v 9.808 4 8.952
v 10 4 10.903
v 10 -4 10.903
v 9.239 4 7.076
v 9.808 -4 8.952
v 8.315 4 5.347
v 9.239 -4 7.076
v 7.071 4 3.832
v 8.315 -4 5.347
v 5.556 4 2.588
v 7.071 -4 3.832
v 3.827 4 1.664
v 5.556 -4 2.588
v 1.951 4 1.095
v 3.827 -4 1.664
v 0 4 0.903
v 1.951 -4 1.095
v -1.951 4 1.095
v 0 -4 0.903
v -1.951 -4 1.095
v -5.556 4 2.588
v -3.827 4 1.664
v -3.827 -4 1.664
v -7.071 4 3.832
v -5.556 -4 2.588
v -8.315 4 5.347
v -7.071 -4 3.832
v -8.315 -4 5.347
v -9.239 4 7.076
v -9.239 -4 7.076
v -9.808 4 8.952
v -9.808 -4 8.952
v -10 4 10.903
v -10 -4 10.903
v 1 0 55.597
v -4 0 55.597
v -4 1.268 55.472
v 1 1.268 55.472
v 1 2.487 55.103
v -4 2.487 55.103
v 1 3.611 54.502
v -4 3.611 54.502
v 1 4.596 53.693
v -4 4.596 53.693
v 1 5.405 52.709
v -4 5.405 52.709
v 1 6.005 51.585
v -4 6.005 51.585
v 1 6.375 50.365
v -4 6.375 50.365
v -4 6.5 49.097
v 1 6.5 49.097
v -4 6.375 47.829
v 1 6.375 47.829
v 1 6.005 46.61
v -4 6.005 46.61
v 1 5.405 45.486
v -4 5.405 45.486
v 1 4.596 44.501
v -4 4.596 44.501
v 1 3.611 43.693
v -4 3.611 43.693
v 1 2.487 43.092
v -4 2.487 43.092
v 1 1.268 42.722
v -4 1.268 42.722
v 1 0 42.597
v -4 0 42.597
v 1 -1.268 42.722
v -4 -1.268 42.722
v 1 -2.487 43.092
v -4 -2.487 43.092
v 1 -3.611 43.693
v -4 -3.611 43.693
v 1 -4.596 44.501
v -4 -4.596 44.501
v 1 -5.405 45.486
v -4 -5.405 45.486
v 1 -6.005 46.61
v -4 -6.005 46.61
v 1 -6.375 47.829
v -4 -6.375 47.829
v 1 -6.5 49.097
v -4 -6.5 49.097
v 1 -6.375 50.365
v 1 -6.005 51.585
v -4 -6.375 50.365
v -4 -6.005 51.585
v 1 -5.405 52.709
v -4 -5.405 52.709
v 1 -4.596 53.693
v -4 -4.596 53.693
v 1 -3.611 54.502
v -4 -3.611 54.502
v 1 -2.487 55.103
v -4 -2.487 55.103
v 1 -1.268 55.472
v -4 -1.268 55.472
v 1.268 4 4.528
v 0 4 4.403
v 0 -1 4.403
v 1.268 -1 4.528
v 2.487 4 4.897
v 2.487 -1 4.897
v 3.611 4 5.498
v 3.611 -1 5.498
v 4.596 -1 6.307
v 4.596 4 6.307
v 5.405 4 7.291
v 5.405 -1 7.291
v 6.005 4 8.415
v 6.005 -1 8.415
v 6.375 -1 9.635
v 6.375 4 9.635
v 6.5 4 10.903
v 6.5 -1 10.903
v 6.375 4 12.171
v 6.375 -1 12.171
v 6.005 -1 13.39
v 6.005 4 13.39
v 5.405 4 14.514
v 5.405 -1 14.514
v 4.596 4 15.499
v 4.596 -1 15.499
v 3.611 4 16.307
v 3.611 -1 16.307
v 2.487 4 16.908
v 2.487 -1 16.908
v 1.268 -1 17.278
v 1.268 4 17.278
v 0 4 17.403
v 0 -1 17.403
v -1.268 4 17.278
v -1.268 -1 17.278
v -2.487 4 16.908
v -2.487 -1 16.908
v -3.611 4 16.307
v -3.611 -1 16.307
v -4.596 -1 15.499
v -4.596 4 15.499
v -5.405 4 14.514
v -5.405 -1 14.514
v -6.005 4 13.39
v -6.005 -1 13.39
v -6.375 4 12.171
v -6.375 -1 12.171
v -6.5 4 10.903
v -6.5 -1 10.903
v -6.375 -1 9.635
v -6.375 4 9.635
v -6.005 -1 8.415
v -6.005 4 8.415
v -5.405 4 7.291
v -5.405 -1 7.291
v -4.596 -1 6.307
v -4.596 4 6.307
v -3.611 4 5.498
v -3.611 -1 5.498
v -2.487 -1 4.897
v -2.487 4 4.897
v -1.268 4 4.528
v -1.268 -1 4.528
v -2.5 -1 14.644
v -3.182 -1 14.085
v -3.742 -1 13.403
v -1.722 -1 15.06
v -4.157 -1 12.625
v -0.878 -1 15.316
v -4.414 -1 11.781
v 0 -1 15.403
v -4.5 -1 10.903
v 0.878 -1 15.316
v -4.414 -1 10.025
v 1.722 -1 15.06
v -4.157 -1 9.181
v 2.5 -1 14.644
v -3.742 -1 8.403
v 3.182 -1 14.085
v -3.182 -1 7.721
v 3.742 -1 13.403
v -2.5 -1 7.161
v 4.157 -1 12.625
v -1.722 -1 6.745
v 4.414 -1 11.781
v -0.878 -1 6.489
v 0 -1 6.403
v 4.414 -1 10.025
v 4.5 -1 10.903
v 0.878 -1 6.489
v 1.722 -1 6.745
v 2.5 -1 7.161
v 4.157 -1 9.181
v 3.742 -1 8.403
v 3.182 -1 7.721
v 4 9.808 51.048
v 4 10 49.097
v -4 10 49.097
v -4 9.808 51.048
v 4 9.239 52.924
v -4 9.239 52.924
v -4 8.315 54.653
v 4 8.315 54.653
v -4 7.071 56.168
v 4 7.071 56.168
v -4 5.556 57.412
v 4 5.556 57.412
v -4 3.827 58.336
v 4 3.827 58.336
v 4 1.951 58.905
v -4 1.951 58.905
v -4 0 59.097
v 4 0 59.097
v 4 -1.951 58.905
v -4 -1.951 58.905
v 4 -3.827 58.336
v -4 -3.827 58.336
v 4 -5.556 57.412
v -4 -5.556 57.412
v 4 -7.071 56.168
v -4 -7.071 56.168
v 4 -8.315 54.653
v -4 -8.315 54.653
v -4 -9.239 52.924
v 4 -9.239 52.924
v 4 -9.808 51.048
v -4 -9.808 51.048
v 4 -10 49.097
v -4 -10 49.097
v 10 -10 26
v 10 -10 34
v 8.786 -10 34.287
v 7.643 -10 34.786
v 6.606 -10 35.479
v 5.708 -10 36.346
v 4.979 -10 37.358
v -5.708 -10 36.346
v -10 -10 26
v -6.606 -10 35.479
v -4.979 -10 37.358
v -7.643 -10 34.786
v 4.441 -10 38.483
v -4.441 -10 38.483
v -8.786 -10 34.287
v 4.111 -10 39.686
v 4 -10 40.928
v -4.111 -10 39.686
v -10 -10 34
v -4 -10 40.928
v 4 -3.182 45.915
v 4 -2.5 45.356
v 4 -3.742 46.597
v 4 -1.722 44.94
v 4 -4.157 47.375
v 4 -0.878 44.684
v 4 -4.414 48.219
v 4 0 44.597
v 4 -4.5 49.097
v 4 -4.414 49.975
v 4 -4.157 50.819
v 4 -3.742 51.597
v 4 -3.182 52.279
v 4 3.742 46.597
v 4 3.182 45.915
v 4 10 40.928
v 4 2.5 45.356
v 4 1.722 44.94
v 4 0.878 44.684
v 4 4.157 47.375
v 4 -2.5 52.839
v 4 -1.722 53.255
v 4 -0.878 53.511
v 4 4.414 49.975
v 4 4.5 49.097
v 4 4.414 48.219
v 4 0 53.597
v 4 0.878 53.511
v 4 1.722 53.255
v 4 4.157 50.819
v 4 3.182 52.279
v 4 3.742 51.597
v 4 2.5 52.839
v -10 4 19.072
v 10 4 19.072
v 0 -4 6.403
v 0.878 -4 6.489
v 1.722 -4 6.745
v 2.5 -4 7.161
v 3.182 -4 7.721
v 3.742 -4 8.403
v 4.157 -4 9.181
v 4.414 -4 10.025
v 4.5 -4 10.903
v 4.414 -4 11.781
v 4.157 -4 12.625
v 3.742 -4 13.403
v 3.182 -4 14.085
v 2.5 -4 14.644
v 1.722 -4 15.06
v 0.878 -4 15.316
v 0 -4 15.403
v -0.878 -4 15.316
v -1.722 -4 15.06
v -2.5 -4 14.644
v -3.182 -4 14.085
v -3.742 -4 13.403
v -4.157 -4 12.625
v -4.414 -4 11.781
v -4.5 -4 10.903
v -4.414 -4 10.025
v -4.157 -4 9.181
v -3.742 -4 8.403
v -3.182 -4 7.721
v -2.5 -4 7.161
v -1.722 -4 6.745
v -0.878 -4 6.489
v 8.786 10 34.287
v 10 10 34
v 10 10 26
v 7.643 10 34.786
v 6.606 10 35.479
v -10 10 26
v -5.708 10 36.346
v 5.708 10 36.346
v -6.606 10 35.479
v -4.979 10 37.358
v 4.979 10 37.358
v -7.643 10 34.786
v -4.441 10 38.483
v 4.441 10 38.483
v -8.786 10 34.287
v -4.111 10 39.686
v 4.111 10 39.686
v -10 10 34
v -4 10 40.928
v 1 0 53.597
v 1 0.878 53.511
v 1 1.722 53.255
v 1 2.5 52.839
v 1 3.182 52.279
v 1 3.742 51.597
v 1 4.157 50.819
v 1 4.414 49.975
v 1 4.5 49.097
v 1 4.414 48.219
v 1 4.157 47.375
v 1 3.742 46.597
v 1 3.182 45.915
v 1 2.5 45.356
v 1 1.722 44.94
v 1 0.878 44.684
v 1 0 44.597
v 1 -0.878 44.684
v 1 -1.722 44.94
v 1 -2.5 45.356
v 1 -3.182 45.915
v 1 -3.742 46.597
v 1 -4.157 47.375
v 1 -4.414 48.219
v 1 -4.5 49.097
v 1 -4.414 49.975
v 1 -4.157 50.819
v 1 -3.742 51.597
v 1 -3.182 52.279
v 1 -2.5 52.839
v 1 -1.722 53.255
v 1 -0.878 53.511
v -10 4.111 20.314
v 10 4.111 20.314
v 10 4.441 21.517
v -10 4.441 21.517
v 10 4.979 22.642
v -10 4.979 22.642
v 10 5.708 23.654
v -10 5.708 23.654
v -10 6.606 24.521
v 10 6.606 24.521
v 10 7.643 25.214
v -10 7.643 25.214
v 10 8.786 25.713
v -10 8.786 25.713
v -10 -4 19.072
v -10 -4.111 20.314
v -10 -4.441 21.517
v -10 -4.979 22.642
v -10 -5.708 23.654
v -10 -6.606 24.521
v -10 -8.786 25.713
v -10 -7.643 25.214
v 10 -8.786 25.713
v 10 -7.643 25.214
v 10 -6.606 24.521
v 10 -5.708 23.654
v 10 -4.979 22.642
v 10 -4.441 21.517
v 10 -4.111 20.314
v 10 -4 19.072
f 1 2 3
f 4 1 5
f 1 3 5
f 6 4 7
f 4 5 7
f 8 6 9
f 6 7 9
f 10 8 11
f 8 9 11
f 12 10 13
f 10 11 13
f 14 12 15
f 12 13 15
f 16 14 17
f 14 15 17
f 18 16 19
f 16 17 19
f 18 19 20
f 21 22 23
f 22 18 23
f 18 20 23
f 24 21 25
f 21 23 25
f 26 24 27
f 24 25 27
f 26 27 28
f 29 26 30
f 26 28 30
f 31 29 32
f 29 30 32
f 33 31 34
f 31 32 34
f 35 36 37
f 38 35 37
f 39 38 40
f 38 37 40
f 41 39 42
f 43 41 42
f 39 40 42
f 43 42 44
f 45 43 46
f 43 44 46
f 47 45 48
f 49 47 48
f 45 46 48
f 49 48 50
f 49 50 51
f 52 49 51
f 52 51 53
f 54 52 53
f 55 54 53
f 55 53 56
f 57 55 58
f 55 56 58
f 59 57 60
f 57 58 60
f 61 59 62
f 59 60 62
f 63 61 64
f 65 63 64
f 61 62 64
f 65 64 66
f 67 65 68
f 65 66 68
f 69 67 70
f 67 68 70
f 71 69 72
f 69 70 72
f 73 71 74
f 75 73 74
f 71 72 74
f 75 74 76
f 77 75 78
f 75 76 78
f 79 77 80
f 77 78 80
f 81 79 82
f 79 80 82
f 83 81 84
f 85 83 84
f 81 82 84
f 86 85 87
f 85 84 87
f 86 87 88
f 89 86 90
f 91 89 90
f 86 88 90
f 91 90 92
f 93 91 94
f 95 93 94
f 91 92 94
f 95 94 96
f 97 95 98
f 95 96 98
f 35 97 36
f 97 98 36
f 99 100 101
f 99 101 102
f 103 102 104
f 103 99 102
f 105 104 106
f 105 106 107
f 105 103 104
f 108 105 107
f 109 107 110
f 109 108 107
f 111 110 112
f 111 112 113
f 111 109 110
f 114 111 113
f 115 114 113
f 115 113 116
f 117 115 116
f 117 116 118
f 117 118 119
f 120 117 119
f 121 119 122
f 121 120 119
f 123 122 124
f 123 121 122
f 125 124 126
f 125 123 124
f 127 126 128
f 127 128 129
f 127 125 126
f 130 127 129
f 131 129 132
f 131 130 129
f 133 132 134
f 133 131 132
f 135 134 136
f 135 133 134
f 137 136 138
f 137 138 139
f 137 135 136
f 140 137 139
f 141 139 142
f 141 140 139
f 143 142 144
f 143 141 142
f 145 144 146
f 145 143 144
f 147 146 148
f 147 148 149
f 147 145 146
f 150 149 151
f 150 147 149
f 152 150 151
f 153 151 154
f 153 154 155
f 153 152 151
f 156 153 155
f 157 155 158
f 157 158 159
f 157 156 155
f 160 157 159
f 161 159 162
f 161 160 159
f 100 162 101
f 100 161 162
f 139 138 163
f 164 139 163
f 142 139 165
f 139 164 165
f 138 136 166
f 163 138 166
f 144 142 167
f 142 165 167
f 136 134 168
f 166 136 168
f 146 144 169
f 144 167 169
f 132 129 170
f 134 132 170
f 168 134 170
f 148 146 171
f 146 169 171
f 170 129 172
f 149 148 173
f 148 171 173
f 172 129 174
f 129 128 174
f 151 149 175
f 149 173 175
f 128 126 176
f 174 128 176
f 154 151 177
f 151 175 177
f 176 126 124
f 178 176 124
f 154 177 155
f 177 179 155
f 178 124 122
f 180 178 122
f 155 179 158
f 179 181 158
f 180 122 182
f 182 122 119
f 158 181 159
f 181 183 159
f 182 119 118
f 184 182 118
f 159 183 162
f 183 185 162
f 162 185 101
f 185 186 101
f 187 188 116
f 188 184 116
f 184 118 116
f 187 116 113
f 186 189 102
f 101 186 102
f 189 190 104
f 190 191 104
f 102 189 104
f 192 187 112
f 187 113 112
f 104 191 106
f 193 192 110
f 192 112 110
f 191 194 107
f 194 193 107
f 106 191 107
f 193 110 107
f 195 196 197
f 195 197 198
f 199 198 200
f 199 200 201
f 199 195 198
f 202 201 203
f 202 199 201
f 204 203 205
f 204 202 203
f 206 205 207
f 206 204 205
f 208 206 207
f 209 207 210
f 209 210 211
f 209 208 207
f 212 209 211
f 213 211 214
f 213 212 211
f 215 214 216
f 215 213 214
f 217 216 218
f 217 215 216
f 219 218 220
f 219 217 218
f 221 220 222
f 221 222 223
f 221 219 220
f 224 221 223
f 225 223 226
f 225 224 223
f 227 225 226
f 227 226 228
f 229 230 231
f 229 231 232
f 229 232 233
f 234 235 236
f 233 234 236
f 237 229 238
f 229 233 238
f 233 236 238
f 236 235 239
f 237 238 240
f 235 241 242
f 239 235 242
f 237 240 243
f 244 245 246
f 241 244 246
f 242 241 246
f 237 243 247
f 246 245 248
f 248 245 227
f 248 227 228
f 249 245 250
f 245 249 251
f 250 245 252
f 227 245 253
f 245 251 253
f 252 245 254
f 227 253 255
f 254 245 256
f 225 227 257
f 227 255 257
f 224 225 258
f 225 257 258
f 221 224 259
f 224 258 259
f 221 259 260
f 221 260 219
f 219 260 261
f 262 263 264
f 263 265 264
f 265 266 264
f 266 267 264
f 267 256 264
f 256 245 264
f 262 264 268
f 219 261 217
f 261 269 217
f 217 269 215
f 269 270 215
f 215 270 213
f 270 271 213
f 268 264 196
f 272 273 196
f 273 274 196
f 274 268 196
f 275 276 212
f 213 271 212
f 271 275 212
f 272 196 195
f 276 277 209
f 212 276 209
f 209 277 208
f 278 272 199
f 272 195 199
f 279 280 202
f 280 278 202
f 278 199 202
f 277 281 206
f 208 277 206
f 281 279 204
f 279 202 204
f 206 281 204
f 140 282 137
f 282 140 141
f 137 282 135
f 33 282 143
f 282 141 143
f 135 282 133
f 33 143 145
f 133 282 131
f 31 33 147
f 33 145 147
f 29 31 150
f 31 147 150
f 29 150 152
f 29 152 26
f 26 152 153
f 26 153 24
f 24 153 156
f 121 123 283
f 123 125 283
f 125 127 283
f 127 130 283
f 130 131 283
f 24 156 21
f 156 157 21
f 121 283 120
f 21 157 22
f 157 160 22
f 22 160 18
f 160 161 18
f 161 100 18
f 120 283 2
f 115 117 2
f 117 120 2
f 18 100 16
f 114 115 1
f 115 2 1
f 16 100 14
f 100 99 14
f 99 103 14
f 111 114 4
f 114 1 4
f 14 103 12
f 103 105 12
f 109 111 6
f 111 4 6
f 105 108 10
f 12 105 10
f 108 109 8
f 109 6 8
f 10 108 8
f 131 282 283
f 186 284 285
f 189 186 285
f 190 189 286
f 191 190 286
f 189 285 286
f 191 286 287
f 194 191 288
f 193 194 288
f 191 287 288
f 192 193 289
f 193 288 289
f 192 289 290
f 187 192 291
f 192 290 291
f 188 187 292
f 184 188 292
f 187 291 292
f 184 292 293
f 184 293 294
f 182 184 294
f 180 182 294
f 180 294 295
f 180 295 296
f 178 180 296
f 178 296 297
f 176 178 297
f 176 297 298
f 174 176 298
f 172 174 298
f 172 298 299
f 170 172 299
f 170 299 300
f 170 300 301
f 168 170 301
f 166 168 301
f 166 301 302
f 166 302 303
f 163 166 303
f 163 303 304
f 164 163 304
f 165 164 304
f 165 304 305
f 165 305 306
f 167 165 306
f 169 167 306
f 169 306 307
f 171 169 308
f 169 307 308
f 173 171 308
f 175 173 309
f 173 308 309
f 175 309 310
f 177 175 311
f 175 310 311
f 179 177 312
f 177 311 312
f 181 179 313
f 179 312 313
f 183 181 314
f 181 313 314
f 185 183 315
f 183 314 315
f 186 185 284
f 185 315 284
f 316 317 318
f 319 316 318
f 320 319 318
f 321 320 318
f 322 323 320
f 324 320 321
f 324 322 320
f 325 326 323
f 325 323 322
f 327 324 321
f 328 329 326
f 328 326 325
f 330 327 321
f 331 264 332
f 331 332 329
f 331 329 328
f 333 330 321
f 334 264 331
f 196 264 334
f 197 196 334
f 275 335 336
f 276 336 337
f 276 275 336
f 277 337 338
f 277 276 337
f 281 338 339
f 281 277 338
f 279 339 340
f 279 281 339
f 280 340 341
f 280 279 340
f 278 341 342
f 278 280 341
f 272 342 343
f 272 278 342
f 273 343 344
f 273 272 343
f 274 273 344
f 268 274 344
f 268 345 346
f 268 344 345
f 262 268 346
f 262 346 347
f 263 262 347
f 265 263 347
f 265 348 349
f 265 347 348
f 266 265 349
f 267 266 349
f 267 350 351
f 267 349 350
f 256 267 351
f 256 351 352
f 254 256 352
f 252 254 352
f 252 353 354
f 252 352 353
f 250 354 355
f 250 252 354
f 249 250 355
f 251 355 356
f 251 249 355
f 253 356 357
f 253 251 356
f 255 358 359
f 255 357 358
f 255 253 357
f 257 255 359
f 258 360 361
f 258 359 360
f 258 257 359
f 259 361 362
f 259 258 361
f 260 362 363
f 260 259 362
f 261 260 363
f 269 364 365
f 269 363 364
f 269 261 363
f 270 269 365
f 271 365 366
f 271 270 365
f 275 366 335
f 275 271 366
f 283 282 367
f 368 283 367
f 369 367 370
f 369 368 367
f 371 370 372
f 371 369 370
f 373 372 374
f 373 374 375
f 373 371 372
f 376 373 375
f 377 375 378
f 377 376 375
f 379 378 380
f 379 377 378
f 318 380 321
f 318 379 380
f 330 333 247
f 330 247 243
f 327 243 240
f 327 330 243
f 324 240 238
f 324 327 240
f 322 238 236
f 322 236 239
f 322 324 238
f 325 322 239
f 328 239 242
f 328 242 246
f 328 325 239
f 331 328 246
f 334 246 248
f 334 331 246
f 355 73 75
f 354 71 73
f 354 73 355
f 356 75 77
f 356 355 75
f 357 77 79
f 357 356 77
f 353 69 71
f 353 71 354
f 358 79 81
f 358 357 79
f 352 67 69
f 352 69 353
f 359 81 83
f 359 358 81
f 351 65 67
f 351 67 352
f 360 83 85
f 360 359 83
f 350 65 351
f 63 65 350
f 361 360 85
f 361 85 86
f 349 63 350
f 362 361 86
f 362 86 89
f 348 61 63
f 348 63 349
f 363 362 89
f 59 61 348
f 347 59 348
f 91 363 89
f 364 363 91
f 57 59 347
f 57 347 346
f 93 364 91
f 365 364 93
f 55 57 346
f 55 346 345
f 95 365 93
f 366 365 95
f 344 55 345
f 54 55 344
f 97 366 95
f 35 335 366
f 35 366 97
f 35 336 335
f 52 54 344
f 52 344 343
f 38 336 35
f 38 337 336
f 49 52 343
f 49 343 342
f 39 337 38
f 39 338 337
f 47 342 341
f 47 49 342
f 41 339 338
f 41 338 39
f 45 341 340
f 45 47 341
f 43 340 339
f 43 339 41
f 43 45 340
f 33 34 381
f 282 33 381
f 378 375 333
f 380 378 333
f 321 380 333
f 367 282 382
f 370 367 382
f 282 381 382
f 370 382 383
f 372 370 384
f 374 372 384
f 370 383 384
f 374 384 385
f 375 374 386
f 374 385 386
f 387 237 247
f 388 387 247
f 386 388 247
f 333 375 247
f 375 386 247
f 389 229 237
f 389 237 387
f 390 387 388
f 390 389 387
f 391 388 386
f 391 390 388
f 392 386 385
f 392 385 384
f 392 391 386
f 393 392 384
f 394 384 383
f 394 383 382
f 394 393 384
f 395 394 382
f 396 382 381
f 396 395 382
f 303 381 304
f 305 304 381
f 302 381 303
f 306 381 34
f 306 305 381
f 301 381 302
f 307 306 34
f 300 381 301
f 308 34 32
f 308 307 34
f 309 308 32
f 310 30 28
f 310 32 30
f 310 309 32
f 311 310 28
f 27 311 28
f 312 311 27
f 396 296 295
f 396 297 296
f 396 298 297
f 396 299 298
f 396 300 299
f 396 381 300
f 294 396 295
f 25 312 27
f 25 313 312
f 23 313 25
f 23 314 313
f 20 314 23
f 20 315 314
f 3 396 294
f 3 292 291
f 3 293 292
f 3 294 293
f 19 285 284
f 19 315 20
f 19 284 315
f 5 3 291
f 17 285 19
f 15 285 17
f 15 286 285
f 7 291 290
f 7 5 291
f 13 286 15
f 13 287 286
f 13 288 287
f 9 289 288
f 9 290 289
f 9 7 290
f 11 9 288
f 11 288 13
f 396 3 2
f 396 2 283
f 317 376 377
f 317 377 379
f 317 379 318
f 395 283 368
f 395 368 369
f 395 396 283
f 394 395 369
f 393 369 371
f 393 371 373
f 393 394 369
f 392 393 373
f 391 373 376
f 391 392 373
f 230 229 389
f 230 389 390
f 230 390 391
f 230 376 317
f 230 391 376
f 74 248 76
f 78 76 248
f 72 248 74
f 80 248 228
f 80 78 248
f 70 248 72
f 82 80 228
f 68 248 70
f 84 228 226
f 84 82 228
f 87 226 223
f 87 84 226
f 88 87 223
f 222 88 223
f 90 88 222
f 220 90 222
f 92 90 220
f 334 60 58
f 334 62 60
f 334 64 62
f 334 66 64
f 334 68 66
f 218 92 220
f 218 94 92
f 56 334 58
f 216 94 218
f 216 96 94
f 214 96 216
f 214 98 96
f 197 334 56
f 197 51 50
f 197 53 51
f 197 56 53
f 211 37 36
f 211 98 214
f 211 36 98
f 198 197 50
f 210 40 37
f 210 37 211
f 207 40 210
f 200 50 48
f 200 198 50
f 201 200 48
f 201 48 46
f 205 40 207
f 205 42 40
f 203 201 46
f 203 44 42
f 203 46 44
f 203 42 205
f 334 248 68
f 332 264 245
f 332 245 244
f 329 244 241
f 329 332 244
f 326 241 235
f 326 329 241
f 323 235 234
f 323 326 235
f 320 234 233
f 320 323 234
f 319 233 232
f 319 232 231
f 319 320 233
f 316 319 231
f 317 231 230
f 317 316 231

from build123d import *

# Parameters (mm, degrees)
SKETCH_1_W          = 20
SKETCH_1_H          = 20
EXTRUDE_1_DEPTH     = 60
SKETCH_7_W          = 26
SKETCH_7_H          = 6
CUT_EXTRUDE_6_DEPTH = 34
SKETCH_2_R          = 6.5
CUT_EXTRUDE_9_DEPTH = 5
SKETCH_3_R          = 4.5
CUT_EXTRUDE_2_DEPTH = 29
MOVE_BODY_1_ANGLE   = 90
SKETCH_8_W          = 20
SKETCH_8_H          = 20
EXTRUDE_2_DEPTH     = 8
FILLET_2_R          = 7


# Read off the part's stored shape, not the designer's step: 교차3
with BuildPart() as part:
    # 스케치1 → 보스-돌출1 (new body)
    with BuildSketch(Plane.XY):
        Rectangle(SKETCH_1_W, SKETCH_1_H)
    extrude(amount=EXTRUDE_1_DEPTH)

    # 스케치7 → 컷-돌출6 (cut)
    with BuildSketch(Plane(origin=(10, 0, 0), x_dir=(0, 0, -1), z_dir=(1, 0, 0))):
        with Locations((-13, 7)):
            Rectangle(SKETCH_7_W, SKETCH_7_H)
        with Locations((-13, -7)):
            Rectangle(SKETCH_7_W, SKETCH_7_H)
    cut_extrude_6 = extrude(amount=-CUT_EXTRUDE_6_DEPTH, mode=Mode.SUBTRACT)

    # 스케치2 → 컷-돌출9 (cut)
    with BuildSketch(Plane(origin=(0, 4, 0), x_dir=(-1, 0, 0), z_dir=(0, -1, 0))):
        with Locations(Location((0, -10.902706153, 0), (0, 0, 90))):
            Circle(SKETCH_2_R)
    cut_extrude_9 = extrude(amount=CUT_EXTRUDE_9_DEPTH, mode=Mode.SUBTRACT)

    # 스케치3 → 컷-돌출2 (cut)
    with BuildSketch(Plane(origin=(0, -4, 0), x_dir=(-1, 0, 0), z_dir=(0, -1, 0))):
        with Locations(Location((0, -10.902706153, 0), (0, 0, 90))):
            Circle(SKETCH_3_R)
        with BuildLine():
            Line((-21.262122506, -10.902706153), (-10, -10.902706153))
            ThreePointArc((-10, -10.902706153), (0, -0.902706153), (10, -10.902706153))
            Line((10, -10.902706153), (21.262122506, -10.902706153))
            ThreePointArc((21.262122506, -10.902706153), (0, 10.359416353), (-21.262122506, -10.902706153))
        make_face()
    cut_extrude_2 = extrude(amount=-CUT_EXTRUDE_2_DEPTH, mode=Mode.SUBTRACT)

    # 대칭 복사6: 컷-돌출6, 컷-돌출9, 컷-돌출2 across plane
    add(cut_extrude_6.mirror(Plane.XY.offset(30)), mode=Mode.SUBTRACT)
    add(cut_extrude_9.mirror(Plane.XY.offset(30)), mode=Mode.SUBTRACT)
    add(cut_extrude_2.mirror(Plane.XY.offset(30)), mode=Mode.SUBTRACT)


with BuildPart() as body_2:
    # 교차3: the piece on the far side of the plane
    add(part.part)
    split(bisect_by=Plane.XY.offset(30), keep=Keep.BOTTOM)


with BuildPart() as part_1:
    add(part.part)

    # 교차3
    split(bisect_by=Plane.XY.offset(30), keep=Keep.TOP)


with BuildPart() as part_2:
    # Move Body 1: moved
    add(part_1.part.rotate(Axis((0, 0, 0), (0, 0, 1)), MOVE_BODY_1_ANGLE))


    add(body_2.part)  # 보스-돌출2 merges body 2
    # 스케치8 → 보스-돌출2 (add)
    with BuildSketch(Plane.XY.offset(34)):
        Rectangle(SKETCH_8_W, SKETCH_8_H)
    extrude(amount=-EXTRUDE_2_DEPTH)

    # 필렛2
    # the kernel refuses this fillet: 7 mm, written as the material it adds along each edge
    with BuildSketch(Plane(origin=(-4, 10, 34), x_dir=(0, 0, 1), z_dir=(0, -1, 0)), Plane(origin=(10, -4, 26), x_dir=(0, 0, -1), z_dir=(-1, 0, 0))) as fillet_2_piece_1:
        with BuildLine():
            CenterArc((6.92820323, 7), FILLET_2_R, 188.213210702, 81.786789298)
            Line((0, 6), (-0.138564065, 5.98))
            ThreePointArc((-0.138564065, 5.98), (-0.14, 3), (-0.14, 0))
            Line((-0.14, 0), (0, -0.14))
            Line((0, -0.14), (6.92820323, -0.14))
            Line((6.92820323, -0.14), (6.92820323, 0))
        make_face()
    extrude(amount=20)
    with BuildSketch(Plane(origin=(4, 10, 34), x_dir=(1, 0, 0), z_dir=(0, -1, 0))) as fillet_2_piece_2:
        with BuildLine():
            CenterArc((7, 6.92820323), FILLET_2_R, 180, 81.786789298)
            Line((0, 6.92820323), (-0.14, 6.92820323))
            Line((-0.14, 6.92820323), (-0.14, 0))
            Line((-0.14, 0), (0, -0.14))
            ThreePointArc((0, -0.14), (3, -0.14), (5.98, -0.138564065))
            Line((5.98, -0.138564065), (6, 0))
        make_face()
    extrude(amount=20)
    with BuildSketch(Plane(origin=(10, 4, 26), x_dir=(0, 0, -1), z_dir=(-1, 0, 0))) as fillet_2_piece_3:
        with BuildLine():
            CenterArc((6.92820323, -7), FILLET_2_R, 90, 81.786789298)
            Line((0, -6), (-0.138564065, -5.98))
            ThreePointArc((-0.138564065, -5.98), (-0.14, -3), (-0.14, 0))
            Line((-0.14, 0), (0, 0.14))
            Line((0, 0.14), (6.92820323, 0.14))
            Line((6.92820323, 0.14), (6.92820323, 0))
        make_face()
    extrude(amount=20)


solid = part_2.part
